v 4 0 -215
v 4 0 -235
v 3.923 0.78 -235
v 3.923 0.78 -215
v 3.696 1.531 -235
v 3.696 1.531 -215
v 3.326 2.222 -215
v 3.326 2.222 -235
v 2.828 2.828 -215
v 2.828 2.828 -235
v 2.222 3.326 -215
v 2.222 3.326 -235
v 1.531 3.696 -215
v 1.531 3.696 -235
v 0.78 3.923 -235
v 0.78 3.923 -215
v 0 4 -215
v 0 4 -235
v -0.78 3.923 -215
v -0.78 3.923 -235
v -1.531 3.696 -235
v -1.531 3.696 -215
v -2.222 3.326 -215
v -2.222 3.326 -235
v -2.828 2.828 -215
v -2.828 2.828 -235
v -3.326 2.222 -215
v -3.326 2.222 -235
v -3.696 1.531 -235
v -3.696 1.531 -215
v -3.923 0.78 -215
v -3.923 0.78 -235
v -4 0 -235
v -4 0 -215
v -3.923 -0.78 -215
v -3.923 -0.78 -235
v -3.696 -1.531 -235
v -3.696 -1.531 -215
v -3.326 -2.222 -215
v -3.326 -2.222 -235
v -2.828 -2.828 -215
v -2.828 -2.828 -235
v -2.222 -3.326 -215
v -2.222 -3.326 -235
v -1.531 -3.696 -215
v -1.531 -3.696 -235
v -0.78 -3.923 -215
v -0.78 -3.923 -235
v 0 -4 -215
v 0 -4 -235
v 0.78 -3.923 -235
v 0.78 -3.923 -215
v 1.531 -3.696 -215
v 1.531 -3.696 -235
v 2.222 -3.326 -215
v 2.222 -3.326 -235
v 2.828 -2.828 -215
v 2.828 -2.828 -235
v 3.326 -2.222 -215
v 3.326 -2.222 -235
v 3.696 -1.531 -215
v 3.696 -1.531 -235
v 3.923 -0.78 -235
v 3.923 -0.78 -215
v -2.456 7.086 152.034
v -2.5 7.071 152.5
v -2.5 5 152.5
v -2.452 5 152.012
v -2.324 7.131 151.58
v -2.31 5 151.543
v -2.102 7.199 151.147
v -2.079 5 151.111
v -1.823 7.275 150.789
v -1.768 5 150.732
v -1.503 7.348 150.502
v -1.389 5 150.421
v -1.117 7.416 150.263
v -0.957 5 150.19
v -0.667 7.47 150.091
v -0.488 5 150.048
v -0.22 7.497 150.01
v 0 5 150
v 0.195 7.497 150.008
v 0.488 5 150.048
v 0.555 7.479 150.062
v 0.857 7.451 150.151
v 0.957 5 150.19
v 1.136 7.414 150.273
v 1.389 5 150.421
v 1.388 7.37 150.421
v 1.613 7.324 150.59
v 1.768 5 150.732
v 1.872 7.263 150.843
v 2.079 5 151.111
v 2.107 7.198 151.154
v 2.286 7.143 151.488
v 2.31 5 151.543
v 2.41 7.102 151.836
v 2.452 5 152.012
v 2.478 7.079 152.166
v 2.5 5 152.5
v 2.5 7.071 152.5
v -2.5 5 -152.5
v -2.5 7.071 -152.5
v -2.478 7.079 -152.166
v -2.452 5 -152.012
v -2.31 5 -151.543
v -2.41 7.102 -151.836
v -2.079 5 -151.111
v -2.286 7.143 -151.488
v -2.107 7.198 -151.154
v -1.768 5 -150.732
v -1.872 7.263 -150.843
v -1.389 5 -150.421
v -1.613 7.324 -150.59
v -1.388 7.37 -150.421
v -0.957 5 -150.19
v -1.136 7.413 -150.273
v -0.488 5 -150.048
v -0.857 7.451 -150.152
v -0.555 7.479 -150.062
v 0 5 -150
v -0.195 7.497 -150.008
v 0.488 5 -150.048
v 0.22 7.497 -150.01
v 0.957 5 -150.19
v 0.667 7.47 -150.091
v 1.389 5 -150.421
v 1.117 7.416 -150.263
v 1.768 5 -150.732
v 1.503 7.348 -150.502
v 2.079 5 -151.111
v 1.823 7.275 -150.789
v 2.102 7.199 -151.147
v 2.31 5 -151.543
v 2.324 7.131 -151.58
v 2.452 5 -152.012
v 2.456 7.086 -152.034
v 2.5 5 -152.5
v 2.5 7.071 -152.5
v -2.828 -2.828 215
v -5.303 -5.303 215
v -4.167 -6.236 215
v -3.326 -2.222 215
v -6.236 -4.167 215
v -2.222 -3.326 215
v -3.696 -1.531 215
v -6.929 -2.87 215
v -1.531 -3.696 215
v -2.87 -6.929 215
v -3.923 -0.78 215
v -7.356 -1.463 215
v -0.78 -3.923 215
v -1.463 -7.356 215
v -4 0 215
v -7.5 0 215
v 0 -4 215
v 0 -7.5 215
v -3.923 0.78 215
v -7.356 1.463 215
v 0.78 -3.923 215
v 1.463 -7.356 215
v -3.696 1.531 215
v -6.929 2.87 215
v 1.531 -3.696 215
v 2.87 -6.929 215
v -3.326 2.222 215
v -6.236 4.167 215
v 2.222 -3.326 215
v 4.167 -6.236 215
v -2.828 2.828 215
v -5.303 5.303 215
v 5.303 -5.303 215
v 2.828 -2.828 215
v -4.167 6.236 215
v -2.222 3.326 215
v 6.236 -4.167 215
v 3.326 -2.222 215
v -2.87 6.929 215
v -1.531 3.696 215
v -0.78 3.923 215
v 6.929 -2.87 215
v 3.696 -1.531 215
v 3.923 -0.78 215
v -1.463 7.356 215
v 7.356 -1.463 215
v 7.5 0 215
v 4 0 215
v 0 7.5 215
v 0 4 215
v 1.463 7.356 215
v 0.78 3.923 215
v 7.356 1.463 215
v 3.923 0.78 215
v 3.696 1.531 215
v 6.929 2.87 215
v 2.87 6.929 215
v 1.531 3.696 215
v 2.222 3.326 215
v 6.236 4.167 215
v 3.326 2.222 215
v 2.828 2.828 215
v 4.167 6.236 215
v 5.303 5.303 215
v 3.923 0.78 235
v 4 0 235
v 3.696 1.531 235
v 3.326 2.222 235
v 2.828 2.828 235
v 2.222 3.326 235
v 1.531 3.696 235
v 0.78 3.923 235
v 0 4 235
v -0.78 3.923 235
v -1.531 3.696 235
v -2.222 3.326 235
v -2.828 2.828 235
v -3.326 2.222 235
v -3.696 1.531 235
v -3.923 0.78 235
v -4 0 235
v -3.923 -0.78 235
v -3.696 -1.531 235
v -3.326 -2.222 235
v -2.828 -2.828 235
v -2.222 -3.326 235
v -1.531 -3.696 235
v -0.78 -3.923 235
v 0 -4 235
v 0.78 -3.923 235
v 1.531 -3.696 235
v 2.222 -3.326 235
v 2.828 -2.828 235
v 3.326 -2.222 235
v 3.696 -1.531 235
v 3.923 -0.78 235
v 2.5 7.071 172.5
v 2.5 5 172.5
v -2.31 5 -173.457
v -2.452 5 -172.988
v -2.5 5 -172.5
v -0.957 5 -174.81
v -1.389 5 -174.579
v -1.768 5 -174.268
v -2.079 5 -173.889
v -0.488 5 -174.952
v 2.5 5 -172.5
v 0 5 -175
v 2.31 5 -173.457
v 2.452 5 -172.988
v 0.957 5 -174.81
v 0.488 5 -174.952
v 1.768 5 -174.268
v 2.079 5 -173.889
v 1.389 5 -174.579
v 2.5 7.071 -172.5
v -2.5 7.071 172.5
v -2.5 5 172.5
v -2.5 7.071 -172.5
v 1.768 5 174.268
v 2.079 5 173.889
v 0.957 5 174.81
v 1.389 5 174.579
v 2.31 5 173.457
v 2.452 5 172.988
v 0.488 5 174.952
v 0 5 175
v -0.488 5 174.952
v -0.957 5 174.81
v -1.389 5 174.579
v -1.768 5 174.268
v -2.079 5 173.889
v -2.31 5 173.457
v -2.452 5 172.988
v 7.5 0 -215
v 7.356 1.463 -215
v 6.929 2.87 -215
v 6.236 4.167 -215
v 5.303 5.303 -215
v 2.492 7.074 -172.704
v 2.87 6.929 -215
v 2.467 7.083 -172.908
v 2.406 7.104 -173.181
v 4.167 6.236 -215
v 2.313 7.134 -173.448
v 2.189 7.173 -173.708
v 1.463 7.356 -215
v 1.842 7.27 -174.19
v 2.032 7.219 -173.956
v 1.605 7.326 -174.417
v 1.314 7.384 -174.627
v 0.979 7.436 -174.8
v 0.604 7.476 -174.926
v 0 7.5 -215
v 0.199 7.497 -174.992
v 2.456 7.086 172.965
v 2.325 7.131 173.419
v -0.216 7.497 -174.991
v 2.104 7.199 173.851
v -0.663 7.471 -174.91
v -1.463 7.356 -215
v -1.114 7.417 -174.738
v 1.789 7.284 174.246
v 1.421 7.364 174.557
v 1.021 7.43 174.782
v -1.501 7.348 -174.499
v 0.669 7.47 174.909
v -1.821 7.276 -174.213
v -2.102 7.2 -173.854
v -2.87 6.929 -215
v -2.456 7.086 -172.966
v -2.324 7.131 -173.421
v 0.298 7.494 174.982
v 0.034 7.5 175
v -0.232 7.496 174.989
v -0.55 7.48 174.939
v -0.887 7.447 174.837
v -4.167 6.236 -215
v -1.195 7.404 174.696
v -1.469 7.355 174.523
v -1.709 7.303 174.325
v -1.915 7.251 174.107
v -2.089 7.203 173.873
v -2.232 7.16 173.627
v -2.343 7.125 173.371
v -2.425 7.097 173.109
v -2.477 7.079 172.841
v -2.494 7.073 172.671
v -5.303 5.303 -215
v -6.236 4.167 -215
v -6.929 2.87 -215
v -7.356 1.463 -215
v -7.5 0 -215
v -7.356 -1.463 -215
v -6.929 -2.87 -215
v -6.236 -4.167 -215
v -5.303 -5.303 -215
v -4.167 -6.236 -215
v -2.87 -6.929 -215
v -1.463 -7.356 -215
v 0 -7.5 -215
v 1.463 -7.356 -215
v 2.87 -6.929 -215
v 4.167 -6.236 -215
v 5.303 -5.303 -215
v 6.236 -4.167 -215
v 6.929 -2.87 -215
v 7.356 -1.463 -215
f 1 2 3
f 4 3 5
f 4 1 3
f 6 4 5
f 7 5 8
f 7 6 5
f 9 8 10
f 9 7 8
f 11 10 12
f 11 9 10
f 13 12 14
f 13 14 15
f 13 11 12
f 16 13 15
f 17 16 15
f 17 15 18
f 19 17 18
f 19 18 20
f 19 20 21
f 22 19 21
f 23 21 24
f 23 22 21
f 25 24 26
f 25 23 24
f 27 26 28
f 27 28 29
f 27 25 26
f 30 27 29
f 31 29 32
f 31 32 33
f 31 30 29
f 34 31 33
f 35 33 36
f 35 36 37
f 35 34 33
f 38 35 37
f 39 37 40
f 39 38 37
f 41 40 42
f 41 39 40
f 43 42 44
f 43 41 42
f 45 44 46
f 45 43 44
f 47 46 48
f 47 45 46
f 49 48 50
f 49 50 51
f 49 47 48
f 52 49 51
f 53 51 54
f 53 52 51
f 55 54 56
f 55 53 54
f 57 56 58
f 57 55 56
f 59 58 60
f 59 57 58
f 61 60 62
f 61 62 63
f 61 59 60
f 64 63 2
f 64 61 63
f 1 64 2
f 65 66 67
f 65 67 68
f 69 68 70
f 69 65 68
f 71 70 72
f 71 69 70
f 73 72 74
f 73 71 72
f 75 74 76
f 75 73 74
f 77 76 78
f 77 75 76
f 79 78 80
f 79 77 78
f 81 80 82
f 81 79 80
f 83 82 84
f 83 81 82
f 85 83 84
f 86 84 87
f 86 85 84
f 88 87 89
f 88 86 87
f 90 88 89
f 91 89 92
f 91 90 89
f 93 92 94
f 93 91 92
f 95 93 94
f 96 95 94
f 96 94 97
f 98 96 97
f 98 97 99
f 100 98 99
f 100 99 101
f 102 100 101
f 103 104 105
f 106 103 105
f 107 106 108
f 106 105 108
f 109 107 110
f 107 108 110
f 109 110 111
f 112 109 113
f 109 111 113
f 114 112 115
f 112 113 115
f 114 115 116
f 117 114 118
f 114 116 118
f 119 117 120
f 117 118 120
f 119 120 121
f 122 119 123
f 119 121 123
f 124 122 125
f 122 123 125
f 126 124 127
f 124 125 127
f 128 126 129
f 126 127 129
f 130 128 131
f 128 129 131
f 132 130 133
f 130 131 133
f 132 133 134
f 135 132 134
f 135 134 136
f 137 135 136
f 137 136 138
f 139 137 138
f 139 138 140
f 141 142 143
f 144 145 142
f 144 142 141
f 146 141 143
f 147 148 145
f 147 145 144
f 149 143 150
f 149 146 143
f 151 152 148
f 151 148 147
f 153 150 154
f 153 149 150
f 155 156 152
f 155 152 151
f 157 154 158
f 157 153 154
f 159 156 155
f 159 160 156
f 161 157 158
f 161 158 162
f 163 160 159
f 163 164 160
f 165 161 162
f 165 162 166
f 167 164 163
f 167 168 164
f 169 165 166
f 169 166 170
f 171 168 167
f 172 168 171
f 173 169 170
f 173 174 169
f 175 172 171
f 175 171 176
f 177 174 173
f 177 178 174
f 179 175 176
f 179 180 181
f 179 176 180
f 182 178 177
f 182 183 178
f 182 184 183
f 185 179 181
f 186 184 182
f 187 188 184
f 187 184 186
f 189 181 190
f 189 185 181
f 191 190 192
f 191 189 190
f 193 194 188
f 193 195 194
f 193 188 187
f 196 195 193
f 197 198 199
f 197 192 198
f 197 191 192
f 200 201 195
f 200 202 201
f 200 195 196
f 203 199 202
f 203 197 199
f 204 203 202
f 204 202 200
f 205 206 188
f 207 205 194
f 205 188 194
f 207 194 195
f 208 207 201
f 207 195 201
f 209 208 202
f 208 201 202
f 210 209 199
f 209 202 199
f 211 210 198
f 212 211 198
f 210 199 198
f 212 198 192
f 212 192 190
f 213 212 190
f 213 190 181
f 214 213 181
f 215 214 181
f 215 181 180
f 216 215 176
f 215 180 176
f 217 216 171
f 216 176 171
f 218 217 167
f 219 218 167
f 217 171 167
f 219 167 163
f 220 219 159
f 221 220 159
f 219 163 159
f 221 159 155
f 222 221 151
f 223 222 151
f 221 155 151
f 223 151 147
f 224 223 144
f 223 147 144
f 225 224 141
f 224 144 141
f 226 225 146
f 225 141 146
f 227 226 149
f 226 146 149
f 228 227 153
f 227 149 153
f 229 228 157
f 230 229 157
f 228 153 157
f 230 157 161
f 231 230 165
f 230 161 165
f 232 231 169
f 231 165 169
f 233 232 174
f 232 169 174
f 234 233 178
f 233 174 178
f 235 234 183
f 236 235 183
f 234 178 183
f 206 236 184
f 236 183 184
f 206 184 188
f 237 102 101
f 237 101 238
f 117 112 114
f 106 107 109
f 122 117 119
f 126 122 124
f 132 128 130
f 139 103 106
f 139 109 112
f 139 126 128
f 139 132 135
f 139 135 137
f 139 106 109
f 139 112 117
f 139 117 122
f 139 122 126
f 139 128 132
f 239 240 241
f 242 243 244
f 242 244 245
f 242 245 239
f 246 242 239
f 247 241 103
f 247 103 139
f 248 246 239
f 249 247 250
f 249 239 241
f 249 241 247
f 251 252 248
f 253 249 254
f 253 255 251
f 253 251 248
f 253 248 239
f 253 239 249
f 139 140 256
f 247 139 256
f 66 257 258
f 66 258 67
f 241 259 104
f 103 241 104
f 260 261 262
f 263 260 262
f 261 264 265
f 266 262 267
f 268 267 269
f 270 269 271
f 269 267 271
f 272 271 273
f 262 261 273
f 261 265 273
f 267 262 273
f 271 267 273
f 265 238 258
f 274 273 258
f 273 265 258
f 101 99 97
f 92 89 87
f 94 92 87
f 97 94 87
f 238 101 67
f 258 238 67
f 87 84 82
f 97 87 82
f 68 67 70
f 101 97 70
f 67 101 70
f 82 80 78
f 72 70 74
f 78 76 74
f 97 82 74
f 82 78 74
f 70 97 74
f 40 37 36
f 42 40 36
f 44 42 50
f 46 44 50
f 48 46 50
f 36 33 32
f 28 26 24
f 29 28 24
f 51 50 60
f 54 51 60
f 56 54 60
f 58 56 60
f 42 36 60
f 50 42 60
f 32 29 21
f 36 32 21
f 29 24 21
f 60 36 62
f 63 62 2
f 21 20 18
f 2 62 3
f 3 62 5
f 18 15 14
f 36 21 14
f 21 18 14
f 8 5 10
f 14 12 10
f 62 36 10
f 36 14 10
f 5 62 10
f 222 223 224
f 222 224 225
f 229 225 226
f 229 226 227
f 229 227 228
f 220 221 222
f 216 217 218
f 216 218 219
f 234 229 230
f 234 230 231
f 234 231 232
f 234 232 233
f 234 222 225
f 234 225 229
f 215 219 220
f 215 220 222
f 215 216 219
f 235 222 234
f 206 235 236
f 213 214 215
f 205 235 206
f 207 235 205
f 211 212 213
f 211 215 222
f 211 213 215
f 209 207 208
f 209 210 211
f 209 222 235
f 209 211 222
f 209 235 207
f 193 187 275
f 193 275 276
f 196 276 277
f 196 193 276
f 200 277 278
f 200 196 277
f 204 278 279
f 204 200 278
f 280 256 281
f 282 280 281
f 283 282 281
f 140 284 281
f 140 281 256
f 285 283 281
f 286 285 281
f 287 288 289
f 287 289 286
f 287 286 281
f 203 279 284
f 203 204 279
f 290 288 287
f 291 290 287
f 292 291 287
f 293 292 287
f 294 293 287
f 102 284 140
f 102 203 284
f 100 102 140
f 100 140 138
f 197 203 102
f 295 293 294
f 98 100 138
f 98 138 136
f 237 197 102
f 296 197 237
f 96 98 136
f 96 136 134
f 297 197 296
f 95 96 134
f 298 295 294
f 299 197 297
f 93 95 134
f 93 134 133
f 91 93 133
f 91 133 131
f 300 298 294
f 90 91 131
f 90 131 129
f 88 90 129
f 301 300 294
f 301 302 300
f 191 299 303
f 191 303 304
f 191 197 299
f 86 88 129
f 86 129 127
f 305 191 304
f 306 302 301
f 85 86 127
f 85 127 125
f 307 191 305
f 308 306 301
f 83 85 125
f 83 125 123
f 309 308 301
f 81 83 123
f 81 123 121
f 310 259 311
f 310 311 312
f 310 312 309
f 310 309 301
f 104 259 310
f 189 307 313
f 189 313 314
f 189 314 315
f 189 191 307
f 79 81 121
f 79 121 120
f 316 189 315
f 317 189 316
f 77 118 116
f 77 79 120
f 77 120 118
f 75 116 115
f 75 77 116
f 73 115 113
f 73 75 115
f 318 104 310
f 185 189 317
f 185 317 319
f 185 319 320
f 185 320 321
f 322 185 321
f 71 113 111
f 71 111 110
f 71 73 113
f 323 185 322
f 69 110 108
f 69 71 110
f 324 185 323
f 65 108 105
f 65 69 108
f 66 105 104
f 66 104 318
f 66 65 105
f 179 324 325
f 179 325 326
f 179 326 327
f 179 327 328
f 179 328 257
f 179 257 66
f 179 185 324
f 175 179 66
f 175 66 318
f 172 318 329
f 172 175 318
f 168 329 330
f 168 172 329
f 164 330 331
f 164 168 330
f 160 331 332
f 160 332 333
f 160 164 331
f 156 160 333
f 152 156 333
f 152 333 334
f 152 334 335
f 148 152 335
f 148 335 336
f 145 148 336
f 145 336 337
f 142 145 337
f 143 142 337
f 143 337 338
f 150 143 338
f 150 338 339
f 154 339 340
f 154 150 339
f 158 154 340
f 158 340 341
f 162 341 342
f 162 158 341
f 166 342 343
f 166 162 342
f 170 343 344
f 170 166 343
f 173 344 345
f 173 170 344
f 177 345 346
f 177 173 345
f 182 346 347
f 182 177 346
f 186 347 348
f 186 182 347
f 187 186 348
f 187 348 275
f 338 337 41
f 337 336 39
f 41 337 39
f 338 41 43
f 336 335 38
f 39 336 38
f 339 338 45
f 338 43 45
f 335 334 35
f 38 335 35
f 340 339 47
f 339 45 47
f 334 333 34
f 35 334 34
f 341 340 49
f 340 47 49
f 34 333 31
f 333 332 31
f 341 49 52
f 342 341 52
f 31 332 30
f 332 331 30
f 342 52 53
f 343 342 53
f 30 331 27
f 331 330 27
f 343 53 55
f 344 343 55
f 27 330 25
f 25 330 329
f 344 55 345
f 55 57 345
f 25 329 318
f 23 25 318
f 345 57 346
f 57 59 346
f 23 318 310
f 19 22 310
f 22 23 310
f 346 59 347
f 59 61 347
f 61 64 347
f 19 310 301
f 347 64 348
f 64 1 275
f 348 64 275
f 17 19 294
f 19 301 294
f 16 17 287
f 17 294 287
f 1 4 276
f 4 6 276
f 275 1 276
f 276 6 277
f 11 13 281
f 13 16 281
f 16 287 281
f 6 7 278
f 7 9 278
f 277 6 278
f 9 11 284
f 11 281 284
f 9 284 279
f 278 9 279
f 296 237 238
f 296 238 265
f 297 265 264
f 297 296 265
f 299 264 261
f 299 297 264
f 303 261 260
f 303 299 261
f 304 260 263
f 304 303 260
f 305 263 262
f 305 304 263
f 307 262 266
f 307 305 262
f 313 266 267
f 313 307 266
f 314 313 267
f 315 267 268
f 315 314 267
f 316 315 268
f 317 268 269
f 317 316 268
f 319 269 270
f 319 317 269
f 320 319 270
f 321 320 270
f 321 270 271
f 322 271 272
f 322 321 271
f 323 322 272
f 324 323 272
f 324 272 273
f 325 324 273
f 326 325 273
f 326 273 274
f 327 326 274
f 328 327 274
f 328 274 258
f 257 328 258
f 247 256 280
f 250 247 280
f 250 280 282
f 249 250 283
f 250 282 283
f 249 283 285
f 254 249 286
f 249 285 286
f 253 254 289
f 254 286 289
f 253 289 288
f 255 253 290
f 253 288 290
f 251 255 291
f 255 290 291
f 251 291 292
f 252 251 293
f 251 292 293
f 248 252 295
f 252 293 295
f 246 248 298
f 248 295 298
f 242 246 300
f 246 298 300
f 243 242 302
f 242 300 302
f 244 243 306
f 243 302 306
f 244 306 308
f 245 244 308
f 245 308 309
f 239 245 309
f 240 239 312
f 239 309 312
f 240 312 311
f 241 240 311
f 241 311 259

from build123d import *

# Parameters (mm, degrees)
SKETCH_1_R          = 7.5
EXTRUDE_1_DEPTH     = 215
CUT_EXTRUDE_1_DEPTH = 2.5
SKETCH_3_R          = 4
EXTRUDE_2_DEPTH     = 20


with BuildPart() as part:
    # 草图1 → 凸台-拉伸1 (new, symmetric)
    with BuildSketch(Plane.XY):
        Circle(SKETCH_1_R)
    extrude(amount=EXTRUDE_1_DEPTH, both=True)

    # 草图2 → 切除-拉伸1 (cut)
    with BuildSketch(Plane(origin=(0, 7.5, 0), x_dir=(1, 0, 0), z_dir=(0, 1, 0))):
        with BuildLine():
            Line((2.5, -152.5), (2.5, -172.5))
            ThreePointArc((2.5, -172.5), (0, -175), (-2.5, -172.5))
            Line((-2.5, -172.5), (-2.5, -152.5))
            ThreePointArc((-2.5, -152.5), (0, -150), (2.5, -152.5))
        make_face()
        with BuildLine():
            Line((2.5, 152.5), (2.5, 172.5))
            ThreePointArc((2.5, 172.5), (0, 175), (-2.5, 172.5))
            Line((-2.5, 172.5), (-2.5, 152.5))
            ThreePointArc((-2.5, 152.5), (0, 150), (2.5, 152.5))
        make_face()
    extrude(amount=-CUT_EXTRUDE_1_DEPTH, mode=Mode.SUBTRACT)

    # 草图3 → 凸台-拉伸2 (add)
    with BuildSketch(Plane.XY.offset(215)):
        Circle(SKETCH_3_R)
    extrude_2 = extrude(amount=EXTRUDE_2_DEPTH)

    # 镜向1: 凸台-拉伸2 across plane
    add(extrude_2.mirror(Plane.XY))


solid = part.part
